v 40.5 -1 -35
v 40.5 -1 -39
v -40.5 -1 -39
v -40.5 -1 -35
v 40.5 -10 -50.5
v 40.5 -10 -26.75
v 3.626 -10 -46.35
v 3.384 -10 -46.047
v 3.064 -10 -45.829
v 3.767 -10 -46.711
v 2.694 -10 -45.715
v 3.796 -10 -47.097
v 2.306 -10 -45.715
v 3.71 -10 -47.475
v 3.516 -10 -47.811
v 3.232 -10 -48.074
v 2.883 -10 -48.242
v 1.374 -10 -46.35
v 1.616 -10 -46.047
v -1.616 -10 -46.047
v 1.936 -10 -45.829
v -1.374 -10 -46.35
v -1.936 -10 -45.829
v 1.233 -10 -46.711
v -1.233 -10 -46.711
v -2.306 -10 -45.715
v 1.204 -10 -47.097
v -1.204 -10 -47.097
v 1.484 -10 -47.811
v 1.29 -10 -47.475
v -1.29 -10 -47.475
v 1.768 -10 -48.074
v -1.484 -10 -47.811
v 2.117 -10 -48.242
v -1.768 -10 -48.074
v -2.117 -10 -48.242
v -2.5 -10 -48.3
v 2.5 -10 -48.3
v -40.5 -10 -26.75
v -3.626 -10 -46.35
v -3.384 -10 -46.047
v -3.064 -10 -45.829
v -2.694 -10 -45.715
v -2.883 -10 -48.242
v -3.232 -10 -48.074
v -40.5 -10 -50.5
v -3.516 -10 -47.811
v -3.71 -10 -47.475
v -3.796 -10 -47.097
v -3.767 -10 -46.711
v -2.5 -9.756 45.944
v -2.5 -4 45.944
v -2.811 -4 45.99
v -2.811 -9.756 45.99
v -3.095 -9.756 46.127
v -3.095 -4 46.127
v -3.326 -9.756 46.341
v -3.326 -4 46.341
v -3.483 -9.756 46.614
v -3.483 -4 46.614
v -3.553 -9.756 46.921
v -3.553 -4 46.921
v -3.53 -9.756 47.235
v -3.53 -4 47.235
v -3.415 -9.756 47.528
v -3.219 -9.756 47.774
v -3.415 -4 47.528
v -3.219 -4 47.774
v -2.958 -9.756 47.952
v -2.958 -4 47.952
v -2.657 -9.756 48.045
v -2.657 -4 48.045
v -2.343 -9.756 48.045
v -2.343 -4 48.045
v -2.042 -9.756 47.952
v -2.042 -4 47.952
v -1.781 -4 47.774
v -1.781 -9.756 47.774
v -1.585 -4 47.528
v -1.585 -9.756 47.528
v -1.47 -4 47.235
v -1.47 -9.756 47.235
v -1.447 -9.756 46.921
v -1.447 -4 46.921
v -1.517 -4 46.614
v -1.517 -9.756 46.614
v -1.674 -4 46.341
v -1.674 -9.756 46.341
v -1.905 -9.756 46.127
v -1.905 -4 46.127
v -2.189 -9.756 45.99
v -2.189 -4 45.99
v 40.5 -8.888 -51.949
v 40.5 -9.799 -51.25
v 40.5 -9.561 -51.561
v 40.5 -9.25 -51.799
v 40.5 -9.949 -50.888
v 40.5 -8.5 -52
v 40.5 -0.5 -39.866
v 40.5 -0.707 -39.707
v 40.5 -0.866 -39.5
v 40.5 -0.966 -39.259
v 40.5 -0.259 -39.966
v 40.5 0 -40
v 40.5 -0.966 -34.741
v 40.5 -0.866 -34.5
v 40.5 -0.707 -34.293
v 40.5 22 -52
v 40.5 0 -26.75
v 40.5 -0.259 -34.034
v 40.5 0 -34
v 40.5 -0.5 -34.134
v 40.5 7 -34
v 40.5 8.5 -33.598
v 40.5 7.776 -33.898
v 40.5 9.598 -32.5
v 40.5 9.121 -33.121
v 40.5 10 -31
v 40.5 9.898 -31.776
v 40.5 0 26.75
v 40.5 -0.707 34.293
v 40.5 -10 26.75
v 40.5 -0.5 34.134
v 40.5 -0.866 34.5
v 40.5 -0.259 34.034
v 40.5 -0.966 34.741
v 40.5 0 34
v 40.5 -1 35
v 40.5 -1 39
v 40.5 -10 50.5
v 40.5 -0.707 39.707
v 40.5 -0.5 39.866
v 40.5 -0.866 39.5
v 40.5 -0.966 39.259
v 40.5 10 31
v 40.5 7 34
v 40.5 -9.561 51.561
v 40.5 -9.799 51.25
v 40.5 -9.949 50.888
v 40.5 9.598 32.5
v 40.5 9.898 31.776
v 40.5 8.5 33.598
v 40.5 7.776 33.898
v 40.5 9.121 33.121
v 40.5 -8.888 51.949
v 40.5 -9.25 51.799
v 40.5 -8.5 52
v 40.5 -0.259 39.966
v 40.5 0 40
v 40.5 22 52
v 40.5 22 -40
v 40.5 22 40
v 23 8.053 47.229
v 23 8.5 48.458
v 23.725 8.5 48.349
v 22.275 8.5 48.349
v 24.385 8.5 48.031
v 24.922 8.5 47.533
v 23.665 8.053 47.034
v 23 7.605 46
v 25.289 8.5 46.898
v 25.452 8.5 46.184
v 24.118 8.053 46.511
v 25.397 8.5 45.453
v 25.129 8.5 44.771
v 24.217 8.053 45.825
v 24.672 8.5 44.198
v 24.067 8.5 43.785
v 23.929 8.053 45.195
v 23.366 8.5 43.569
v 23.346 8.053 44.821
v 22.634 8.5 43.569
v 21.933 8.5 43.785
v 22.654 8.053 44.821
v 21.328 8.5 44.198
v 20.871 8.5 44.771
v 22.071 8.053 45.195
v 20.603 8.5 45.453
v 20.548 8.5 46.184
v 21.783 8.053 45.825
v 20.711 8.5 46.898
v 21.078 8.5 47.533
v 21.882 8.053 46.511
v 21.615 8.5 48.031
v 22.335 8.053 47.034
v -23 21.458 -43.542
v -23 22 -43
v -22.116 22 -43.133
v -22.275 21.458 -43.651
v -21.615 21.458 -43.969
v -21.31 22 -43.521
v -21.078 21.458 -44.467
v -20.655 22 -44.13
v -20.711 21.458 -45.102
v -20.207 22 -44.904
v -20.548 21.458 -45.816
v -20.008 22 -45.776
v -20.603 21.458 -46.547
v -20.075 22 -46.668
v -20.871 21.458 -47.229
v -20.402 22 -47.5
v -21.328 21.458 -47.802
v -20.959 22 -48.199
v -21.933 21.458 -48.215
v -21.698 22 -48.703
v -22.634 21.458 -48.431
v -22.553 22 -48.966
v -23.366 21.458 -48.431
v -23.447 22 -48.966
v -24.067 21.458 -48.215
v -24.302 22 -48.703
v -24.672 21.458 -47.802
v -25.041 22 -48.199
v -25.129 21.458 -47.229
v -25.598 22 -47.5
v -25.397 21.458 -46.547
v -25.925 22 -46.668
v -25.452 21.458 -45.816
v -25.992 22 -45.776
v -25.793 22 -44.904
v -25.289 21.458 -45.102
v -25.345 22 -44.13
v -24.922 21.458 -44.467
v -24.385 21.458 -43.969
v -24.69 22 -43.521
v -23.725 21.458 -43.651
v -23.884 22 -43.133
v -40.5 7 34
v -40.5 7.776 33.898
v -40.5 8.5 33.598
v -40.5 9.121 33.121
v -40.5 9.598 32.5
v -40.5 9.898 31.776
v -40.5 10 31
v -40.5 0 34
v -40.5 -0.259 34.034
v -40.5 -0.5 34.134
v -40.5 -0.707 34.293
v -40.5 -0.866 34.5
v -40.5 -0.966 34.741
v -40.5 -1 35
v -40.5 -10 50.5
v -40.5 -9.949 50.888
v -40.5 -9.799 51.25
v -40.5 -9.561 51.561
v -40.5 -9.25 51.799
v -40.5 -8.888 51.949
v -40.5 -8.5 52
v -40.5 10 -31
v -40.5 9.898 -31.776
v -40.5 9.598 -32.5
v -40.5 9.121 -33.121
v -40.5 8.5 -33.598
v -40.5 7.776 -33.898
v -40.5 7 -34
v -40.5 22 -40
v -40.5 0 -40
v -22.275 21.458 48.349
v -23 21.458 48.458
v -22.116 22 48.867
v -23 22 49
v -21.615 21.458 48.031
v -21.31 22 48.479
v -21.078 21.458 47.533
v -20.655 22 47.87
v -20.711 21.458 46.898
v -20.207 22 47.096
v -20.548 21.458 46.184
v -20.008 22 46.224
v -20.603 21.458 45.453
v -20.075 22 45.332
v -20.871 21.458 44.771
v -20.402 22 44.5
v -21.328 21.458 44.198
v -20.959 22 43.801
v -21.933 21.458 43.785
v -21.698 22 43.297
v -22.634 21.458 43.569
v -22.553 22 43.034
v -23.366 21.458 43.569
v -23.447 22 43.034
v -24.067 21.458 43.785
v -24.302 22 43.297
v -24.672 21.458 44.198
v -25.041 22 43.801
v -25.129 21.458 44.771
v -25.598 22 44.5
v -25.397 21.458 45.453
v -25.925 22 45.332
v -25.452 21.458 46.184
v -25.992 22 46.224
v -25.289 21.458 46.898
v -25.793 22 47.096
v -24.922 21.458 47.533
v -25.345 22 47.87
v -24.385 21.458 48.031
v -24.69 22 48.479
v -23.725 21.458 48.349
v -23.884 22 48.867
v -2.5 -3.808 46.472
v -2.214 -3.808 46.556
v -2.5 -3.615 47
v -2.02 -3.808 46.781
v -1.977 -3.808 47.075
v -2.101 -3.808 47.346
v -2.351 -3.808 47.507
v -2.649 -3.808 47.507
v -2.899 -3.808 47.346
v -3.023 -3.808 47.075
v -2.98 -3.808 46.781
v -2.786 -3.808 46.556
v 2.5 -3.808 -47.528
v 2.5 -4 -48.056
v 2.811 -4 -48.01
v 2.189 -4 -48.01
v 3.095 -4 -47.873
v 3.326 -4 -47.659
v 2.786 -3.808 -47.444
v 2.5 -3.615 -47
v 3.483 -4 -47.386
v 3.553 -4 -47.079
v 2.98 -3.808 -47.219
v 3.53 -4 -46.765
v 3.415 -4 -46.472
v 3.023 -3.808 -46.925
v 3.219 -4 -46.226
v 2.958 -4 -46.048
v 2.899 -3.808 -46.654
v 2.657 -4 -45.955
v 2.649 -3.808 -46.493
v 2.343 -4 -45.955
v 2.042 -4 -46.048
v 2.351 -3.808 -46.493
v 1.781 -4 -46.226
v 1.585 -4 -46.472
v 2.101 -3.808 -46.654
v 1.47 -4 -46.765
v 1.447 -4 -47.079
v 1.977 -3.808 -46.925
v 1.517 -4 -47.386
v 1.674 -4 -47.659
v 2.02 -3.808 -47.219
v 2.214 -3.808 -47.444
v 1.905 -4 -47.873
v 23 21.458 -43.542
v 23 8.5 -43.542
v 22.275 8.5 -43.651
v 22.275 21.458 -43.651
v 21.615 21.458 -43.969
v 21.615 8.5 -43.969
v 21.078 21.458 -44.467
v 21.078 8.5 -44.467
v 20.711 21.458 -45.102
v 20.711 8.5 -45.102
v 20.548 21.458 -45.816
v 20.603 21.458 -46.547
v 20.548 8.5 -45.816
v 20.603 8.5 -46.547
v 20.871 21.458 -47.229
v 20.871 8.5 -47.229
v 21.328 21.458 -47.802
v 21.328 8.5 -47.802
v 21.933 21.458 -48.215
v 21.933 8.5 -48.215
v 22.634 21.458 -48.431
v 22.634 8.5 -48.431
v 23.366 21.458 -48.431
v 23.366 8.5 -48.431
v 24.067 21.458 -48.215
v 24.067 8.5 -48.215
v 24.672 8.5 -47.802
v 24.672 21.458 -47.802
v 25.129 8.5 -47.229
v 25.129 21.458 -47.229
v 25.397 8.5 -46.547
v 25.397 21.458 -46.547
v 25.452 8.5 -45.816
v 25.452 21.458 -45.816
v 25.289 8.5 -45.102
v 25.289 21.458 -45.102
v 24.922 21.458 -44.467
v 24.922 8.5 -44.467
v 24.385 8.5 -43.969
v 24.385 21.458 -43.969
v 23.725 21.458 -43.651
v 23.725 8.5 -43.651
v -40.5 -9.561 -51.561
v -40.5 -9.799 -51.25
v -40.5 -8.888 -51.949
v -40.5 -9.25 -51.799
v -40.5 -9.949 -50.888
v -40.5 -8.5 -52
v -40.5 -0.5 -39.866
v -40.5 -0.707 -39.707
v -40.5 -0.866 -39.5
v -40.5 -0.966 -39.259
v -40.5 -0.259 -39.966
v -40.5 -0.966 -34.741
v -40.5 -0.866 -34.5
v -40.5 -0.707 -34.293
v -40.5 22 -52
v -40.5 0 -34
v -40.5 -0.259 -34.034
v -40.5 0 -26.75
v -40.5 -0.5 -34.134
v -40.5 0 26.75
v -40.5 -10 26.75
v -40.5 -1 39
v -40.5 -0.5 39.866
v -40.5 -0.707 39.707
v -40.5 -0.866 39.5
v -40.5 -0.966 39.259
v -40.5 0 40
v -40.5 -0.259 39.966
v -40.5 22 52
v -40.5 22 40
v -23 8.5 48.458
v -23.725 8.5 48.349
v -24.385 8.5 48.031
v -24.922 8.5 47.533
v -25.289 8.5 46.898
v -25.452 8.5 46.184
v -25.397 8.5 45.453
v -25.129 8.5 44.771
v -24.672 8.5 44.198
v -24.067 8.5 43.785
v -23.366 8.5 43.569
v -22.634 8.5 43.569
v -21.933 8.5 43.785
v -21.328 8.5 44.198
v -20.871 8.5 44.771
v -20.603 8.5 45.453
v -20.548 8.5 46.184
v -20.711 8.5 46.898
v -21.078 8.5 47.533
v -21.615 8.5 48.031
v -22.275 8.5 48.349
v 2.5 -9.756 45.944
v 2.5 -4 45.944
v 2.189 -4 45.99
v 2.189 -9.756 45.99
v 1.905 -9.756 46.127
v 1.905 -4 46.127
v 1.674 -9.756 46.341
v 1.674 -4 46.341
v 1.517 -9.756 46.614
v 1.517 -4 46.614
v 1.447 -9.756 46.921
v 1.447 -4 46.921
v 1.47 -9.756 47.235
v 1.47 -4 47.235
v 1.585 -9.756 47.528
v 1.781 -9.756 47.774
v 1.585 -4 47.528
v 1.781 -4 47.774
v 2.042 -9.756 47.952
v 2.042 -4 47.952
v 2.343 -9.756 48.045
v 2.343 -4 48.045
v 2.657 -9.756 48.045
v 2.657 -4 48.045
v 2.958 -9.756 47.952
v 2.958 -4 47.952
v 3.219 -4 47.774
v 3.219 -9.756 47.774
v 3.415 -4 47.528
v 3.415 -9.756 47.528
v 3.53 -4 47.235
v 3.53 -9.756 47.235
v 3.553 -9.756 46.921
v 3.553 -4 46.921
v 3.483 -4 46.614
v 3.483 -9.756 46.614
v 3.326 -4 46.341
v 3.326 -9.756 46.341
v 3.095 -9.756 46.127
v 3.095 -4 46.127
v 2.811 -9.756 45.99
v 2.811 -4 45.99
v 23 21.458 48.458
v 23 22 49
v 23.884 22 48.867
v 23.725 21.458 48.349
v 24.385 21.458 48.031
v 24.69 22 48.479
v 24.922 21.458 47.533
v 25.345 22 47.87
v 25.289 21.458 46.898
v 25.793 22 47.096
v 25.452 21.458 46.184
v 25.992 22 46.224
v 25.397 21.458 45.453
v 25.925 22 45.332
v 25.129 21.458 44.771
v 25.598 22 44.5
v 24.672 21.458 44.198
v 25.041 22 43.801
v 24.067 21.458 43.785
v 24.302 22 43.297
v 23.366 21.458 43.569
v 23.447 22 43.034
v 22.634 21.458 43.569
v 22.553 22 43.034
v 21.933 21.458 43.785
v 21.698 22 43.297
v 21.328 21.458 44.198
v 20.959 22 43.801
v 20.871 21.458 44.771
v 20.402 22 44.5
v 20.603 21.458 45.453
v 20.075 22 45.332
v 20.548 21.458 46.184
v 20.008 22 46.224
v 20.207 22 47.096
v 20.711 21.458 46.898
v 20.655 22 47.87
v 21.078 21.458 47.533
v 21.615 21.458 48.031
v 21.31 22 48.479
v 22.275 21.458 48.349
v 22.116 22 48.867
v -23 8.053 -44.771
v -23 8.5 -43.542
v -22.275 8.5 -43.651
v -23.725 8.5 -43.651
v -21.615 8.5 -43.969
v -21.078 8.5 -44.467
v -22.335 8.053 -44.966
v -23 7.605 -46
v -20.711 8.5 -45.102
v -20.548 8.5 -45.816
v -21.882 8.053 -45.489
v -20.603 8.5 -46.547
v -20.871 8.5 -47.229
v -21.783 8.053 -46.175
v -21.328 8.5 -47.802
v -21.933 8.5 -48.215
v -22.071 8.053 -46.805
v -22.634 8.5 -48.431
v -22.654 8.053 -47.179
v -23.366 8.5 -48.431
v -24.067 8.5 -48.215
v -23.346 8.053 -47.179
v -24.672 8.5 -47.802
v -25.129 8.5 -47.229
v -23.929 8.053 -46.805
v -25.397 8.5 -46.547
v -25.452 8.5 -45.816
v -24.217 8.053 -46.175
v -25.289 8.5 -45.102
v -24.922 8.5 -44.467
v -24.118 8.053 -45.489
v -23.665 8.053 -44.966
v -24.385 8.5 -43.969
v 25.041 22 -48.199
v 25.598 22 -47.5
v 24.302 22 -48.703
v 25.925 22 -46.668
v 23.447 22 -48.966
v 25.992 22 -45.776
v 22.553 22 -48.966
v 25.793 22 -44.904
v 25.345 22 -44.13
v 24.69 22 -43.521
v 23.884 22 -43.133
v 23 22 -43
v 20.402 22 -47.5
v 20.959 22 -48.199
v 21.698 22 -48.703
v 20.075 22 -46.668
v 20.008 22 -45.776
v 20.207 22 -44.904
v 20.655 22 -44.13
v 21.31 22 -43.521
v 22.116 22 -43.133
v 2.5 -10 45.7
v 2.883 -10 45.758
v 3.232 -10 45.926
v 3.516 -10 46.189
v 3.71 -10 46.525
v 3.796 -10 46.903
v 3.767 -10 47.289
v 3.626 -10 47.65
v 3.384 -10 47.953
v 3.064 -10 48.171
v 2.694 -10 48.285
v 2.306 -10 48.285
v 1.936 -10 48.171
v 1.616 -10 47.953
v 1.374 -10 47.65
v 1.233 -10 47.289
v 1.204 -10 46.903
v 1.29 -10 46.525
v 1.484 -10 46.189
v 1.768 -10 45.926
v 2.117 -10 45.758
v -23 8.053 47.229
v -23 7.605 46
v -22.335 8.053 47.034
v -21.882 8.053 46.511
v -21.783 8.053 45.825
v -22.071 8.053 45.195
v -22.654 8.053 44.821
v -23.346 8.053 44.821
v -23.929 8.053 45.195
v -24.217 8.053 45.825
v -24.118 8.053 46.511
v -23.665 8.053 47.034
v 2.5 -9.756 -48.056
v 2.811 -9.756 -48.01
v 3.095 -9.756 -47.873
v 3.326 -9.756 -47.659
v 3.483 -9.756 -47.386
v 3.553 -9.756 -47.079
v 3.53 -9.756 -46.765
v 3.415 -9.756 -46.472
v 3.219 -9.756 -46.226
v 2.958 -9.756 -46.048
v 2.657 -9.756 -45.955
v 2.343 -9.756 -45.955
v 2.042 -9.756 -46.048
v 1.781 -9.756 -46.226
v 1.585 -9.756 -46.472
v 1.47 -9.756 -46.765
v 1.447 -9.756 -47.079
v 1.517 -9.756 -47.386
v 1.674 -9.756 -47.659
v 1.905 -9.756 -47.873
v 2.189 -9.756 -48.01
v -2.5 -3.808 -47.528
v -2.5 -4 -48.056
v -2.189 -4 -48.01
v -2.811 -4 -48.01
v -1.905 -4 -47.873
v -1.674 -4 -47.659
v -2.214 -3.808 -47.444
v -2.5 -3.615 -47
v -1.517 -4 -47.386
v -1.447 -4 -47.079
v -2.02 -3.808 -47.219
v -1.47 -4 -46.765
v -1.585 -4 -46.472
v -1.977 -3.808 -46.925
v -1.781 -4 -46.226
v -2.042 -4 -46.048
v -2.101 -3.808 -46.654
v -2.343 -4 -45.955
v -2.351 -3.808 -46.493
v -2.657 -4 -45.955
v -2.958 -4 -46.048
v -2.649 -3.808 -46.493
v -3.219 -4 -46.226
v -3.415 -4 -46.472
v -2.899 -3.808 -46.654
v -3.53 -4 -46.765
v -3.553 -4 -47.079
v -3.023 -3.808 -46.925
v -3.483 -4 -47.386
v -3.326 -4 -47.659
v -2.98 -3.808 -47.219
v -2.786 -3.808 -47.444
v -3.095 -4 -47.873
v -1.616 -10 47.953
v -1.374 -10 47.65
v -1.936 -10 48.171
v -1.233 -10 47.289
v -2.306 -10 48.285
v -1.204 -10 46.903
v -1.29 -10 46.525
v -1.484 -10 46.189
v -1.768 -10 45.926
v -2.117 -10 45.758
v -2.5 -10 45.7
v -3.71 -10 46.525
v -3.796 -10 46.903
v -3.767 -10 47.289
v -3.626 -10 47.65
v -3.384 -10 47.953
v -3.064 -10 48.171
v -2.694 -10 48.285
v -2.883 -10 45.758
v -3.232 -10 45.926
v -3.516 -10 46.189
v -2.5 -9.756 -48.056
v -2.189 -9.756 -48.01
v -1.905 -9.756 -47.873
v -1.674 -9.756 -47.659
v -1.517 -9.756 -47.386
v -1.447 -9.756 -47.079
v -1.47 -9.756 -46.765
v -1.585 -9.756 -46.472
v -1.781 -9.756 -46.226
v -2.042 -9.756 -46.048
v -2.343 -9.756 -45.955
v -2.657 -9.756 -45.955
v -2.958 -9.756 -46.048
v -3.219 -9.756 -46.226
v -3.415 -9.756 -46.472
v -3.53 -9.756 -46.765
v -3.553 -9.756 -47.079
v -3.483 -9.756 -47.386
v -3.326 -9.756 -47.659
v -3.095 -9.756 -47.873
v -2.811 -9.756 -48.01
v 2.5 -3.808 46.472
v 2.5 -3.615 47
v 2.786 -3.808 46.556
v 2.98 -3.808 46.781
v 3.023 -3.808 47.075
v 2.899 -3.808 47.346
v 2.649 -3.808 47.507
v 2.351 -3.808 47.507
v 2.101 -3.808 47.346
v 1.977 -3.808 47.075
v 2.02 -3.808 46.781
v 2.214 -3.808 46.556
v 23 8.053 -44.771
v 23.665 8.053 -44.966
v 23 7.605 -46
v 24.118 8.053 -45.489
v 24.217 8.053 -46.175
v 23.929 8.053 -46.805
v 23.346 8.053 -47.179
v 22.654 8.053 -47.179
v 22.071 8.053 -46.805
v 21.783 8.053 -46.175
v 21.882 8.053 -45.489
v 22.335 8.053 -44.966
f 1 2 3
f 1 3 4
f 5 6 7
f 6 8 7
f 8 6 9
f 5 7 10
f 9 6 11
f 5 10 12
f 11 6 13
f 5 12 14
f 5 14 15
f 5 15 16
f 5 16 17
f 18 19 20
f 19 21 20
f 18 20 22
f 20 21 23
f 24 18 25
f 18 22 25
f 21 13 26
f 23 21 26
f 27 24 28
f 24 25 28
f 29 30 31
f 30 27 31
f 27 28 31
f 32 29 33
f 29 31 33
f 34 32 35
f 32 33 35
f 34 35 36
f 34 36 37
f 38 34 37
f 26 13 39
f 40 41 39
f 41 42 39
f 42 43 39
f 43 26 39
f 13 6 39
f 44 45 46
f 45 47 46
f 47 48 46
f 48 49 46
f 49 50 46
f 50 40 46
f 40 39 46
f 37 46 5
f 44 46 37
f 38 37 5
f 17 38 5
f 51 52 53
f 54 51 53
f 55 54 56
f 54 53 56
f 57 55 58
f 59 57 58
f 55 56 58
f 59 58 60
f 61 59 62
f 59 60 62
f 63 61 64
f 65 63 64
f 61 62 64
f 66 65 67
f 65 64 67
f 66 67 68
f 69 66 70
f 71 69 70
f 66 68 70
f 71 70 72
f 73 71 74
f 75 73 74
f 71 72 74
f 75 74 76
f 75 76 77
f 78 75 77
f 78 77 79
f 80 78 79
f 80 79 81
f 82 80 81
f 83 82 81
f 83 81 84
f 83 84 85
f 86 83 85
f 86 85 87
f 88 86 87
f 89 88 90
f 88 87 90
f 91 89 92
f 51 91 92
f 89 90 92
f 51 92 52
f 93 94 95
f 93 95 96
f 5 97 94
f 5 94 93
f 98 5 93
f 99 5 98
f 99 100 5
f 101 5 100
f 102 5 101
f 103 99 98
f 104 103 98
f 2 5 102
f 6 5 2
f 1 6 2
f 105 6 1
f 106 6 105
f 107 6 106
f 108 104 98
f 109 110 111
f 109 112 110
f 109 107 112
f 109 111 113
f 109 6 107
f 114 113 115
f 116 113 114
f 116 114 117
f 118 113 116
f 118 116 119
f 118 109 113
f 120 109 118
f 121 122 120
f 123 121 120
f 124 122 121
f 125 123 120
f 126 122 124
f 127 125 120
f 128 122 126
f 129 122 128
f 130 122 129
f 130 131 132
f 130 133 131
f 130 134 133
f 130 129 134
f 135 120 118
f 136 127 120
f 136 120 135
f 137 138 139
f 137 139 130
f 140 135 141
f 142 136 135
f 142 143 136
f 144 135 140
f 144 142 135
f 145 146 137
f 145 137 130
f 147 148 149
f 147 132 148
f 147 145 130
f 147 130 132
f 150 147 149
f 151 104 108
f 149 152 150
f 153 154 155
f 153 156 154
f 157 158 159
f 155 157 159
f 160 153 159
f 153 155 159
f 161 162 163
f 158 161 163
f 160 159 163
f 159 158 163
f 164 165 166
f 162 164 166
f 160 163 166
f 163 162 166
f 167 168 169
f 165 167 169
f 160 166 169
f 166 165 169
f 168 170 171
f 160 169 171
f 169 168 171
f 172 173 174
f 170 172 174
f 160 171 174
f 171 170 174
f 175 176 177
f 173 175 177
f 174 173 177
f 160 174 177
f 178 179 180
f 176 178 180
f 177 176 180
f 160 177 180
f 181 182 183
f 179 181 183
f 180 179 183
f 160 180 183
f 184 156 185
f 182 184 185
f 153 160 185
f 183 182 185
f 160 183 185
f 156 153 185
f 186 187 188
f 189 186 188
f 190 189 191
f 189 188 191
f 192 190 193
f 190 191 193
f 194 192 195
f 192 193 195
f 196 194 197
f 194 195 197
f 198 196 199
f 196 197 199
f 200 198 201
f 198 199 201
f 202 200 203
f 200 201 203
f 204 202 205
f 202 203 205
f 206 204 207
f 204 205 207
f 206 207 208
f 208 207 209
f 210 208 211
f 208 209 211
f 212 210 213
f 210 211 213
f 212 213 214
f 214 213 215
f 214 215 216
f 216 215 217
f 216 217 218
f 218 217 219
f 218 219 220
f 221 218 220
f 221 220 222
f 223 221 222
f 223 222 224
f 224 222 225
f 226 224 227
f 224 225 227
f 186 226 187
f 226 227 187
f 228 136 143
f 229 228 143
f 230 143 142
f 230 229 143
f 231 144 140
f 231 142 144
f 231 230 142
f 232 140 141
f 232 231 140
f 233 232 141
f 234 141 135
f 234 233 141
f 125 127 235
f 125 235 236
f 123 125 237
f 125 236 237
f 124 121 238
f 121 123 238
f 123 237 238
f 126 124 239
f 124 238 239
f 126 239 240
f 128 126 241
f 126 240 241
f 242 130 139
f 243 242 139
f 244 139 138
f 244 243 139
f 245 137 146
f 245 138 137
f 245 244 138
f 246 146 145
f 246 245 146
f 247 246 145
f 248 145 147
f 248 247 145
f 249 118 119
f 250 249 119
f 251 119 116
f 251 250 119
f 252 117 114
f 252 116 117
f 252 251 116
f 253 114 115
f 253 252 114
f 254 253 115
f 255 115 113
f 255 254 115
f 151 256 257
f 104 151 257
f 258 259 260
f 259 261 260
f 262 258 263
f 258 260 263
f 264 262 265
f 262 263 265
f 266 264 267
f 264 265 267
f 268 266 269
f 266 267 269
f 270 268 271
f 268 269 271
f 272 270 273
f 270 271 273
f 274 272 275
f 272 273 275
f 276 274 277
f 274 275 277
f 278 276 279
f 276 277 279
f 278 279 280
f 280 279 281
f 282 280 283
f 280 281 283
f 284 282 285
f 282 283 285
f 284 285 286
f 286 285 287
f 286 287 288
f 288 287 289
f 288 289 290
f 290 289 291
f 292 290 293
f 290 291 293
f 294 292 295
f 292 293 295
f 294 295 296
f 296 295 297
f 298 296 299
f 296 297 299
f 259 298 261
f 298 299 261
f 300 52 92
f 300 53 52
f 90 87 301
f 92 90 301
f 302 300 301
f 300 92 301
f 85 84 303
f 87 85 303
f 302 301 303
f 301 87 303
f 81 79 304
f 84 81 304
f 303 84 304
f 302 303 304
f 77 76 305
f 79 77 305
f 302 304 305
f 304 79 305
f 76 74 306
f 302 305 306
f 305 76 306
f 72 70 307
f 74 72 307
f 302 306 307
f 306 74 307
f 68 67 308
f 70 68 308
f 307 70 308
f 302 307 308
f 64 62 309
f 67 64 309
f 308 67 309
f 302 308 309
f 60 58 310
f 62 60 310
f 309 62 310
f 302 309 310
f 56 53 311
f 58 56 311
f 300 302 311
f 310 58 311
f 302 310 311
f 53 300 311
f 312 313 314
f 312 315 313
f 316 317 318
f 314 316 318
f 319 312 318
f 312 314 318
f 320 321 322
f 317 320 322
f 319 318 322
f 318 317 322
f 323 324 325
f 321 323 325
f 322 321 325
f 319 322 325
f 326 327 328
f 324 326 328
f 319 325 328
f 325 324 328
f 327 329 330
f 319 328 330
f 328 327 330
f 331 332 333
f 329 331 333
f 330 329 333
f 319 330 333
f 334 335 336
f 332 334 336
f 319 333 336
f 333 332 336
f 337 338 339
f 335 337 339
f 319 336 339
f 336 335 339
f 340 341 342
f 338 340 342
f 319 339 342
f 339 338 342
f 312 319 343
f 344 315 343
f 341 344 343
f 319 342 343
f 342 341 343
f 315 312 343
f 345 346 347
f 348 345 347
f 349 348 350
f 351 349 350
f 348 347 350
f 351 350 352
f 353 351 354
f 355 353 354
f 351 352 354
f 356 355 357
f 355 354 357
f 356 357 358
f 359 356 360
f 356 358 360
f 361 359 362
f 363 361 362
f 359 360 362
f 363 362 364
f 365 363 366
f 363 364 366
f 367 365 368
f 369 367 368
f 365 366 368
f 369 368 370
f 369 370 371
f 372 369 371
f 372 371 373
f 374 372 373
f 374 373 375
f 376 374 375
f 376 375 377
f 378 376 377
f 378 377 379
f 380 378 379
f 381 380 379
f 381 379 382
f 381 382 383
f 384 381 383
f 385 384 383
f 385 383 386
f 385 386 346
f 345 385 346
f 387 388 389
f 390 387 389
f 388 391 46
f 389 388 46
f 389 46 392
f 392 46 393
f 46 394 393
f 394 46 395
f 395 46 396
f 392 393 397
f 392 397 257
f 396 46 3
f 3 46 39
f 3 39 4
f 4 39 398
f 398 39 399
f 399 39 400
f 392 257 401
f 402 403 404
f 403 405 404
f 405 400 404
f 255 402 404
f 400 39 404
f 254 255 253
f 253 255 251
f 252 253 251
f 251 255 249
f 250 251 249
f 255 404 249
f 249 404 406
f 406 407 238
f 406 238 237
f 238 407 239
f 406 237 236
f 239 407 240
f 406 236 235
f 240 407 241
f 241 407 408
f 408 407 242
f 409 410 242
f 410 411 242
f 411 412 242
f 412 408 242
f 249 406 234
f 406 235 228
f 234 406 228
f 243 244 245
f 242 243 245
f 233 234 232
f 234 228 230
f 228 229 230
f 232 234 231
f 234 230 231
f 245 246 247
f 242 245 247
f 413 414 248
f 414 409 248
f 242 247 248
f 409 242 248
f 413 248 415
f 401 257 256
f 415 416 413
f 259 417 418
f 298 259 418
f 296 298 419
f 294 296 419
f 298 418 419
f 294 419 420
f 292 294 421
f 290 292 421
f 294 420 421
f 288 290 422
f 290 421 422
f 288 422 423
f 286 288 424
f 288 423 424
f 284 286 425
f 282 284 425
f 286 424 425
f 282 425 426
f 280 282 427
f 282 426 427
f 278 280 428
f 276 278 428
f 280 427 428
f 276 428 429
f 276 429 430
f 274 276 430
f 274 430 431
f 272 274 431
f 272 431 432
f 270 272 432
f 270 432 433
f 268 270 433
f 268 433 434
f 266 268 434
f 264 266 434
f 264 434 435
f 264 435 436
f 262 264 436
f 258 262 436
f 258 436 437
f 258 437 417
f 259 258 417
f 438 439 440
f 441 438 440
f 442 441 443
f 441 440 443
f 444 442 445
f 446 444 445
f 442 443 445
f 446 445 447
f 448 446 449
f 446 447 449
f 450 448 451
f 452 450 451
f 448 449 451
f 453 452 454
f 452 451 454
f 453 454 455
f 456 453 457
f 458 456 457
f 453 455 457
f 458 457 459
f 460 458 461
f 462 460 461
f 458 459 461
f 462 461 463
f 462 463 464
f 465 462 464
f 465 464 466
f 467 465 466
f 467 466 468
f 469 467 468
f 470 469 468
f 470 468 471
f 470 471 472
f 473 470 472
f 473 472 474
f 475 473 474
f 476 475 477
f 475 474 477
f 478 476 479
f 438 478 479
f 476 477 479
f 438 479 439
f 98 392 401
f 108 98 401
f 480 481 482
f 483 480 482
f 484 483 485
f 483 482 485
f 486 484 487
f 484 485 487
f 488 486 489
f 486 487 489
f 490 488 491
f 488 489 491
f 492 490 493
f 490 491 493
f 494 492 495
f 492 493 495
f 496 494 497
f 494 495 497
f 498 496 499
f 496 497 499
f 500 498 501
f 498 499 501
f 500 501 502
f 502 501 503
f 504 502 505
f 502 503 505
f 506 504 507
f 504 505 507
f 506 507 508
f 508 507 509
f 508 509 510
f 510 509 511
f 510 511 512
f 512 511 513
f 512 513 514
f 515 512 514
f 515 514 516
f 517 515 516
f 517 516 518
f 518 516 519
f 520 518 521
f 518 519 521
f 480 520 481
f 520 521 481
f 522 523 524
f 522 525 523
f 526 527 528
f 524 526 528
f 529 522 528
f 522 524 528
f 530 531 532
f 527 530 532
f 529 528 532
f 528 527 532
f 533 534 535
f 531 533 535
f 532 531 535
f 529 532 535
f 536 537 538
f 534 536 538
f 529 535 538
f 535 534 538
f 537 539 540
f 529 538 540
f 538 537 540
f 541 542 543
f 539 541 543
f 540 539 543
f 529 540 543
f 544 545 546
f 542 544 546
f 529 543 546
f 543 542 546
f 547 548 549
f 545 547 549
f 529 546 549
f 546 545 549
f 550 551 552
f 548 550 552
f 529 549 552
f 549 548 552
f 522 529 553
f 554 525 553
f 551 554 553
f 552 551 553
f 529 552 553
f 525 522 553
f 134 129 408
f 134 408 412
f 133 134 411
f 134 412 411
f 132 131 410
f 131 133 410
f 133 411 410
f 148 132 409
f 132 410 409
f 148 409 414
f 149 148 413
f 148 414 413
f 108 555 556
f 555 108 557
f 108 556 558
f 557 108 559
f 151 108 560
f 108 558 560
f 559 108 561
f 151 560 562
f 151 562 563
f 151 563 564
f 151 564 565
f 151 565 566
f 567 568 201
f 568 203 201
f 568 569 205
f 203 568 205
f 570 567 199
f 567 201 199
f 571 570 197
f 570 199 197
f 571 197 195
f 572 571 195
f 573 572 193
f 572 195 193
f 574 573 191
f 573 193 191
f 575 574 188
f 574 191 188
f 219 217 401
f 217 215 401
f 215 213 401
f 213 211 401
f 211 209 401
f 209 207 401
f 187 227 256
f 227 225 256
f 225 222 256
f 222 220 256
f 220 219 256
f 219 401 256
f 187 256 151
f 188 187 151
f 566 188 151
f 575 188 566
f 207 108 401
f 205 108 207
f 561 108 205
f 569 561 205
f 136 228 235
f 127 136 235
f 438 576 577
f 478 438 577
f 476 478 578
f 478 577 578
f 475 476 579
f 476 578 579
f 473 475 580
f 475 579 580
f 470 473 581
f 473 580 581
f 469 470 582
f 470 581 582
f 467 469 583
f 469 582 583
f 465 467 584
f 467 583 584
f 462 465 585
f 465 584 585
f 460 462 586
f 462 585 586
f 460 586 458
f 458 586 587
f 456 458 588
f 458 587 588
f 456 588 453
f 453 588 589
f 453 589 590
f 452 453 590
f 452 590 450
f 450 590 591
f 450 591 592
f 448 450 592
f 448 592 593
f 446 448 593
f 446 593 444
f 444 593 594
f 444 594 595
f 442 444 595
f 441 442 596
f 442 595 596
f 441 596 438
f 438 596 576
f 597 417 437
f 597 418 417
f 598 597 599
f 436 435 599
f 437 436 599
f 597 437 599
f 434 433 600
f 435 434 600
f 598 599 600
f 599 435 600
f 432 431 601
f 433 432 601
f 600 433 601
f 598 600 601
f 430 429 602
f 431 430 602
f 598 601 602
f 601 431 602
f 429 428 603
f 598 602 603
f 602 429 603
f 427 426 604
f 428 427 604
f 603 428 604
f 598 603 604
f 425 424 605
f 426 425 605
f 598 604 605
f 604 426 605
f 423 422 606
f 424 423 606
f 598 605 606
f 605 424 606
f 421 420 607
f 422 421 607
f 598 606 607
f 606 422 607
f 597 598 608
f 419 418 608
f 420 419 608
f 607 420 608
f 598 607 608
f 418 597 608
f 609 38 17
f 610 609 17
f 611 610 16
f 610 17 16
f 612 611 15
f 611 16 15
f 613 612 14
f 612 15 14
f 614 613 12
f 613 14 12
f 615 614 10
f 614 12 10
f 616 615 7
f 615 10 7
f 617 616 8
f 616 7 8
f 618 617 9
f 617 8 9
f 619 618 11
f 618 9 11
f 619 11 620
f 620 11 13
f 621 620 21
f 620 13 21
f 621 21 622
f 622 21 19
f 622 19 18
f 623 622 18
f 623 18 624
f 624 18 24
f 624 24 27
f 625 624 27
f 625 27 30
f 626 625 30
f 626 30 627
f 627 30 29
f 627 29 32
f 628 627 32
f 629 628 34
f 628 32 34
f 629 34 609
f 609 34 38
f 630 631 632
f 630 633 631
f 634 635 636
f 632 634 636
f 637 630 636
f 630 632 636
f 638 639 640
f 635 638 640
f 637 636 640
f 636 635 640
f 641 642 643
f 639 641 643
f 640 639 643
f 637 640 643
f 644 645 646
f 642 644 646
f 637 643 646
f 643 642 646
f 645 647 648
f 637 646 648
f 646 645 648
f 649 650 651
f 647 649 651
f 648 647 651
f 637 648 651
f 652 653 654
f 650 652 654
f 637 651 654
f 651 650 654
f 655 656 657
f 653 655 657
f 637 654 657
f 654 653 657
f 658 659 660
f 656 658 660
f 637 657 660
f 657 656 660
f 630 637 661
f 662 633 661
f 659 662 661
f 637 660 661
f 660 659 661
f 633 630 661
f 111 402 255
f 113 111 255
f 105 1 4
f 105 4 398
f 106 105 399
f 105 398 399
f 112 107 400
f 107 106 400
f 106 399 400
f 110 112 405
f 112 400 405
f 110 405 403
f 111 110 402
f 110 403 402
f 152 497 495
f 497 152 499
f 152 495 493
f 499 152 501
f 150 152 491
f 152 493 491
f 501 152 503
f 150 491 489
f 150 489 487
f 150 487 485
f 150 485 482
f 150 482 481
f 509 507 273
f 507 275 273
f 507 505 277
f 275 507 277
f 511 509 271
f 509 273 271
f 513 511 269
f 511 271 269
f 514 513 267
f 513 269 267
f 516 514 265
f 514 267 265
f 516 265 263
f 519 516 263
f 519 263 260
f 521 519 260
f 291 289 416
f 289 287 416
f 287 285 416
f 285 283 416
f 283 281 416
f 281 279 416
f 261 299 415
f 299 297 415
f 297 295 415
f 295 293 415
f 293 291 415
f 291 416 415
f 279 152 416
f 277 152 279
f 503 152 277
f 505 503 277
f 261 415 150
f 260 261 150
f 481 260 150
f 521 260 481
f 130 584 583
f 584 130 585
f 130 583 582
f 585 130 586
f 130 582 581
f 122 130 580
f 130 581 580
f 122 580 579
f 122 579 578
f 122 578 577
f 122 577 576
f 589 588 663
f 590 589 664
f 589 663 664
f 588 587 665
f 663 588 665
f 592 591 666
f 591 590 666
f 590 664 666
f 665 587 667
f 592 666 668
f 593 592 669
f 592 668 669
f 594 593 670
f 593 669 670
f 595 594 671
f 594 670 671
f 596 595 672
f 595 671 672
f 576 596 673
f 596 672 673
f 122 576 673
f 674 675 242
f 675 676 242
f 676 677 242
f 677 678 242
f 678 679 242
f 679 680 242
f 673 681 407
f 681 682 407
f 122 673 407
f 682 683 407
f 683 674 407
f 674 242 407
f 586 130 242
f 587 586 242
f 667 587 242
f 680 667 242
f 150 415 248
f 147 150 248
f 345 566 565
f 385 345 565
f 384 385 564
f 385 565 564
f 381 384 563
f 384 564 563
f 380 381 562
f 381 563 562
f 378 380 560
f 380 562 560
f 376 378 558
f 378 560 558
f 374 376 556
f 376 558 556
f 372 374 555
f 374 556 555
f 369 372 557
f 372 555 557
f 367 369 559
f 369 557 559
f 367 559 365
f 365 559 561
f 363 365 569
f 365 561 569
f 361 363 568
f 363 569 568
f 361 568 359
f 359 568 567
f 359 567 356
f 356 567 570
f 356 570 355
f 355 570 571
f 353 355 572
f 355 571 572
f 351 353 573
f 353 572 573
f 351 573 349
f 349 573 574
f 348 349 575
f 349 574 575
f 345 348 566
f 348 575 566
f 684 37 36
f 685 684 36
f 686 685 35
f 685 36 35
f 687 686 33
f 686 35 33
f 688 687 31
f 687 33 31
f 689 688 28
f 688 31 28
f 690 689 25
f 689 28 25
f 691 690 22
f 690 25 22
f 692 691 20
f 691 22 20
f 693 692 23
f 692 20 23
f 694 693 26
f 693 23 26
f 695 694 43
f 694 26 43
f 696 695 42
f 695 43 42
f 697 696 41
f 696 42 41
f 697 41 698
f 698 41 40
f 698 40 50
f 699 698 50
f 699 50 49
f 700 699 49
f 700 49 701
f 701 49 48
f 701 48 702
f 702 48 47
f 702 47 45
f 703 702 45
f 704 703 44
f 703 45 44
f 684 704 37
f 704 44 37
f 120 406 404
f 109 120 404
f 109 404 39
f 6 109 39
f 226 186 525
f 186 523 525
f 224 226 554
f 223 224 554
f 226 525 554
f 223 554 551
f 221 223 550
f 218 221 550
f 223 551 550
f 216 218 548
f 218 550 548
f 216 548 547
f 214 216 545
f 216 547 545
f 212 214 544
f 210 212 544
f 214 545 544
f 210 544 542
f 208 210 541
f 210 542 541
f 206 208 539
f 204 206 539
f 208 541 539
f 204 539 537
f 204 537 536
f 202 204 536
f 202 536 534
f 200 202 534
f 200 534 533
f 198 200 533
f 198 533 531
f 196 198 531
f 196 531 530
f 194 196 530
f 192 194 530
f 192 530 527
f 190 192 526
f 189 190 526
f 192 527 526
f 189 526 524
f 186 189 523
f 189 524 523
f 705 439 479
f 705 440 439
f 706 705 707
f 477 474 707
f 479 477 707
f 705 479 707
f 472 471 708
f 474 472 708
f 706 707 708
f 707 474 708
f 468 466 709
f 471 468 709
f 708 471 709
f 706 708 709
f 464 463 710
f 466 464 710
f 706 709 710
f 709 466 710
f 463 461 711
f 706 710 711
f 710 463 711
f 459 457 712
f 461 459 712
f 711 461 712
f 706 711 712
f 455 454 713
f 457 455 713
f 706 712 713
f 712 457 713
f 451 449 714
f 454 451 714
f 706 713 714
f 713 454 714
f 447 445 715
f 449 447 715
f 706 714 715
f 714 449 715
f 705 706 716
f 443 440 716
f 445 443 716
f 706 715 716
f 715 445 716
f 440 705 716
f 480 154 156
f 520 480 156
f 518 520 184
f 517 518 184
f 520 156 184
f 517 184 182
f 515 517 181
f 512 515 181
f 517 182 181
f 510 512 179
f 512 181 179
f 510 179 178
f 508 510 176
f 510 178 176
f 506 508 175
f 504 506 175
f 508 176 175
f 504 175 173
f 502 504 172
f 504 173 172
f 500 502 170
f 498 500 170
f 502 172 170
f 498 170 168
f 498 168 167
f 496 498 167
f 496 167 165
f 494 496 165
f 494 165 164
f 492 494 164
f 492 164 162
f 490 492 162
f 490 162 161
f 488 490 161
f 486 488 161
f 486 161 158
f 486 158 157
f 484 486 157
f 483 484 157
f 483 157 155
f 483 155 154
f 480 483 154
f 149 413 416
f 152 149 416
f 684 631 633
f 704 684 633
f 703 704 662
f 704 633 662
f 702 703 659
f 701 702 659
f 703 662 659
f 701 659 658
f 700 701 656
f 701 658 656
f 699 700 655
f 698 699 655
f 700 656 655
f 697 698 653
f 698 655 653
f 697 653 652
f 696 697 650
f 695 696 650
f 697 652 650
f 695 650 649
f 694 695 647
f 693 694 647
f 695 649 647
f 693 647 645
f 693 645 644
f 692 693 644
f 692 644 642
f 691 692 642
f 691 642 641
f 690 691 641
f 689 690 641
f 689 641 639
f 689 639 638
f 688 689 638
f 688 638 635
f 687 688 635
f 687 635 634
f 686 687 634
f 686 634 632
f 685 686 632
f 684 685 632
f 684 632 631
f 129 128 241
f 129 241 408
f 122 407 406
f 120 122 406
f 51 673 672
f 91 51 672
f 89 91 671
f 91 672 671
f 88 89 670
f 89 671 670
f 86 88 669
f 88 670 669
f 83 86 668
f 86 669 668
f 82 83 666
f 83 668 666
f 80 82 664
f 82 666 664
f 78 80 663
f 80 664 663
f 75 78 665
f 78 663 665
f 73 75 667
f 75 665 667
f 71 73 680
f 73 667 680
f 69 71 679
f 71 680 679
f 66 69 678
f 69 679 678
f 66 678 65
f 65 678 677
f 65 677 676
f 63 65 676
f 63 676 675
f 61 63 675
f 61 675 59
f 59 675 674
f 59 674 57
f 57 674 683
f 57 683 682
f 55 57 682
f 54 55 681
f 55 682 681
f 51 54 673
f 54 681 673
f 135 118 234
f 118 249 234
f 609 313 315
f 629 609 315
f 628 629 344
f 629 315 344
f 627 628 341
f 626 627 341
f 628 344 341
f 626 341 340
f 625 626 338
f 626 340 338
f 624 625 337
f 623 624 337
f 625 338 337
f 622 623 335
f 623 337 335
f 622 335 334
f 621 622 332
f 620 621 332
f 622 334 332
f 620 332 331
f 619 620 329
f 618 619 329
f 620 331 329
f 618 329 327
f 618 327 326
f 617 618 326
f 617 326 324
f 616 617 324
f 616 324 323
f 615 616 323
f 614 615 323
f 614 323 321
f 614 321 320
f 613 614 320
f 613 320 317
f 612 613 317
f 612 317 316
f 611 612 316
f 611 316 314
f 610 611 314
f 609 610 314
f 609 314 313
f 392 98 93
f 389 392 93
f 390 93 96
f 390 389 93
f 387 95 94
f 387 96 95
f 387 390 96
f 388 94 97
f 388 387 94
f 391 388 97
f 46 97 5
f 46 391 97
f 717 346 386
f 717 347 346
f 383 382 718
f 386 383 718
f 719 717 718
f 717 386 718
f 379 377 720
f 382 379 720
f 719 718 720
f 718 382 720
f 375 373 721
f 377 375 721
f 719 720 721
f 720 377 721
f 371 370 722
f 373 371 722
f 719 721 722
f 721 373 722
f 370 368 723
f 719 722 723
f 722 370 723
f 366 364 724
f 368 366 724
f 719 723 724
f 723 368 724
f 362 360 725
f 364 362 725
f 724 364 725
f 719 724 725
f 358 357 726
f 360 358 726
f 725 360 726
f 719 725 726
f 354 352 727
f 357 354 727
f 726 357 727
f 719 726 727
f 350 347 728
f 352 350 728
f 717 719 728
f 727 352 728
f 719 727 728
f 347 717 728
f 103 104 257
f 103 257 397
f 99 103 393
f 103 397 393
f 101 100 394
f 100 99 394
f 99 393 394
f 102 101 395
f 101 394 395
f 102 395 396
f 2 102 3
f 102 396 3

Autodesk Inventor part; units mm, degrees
sketch "Sketch_1" plane through (0, 0, 0) normal (1, 0, 0) x (0, 1, 0)
  line L0 (22, 52) -> (-8.5, 52)
  arc A0 (-8.5, 52) -> (-10, 50.5) centre (-8.5, 50.5) ccw
  line L1 (-10, 50.5) -> (-10, 26.75)
  line L2 (-10, 26.75) -> (0, 26.75)
  line L3 (0, 26.75) -> (0, -26.75)
  line L4 (0, -26.75) -> (-10, -26.75)
  line L5 (-10, -26.75) -> (-10, -50.5)
  arc A1 (-10, -50.5) -> (-8.5, -52) centre (-8.5, -50.5) ccw
  line L6 (-8.5, -52) -> (22, -52)
  line L7 (22, -52) -> (22, -40)
  line L8 (22, -40) -> (0, -40)
  arc A2 (-1, -39) -> (0, -40) centre (0, -39) ccw
  line L9 (-1, -39) -> (-1, -35)
  arc A3 (0, -34) -> (-1, -35) centre (0, -35) ccw
  line L10 (0, -34) -> (7, -34)
  arc A4 (7, -34) -> (10, -31) centre (7, -31) ccw
  line L11 (10, -31) -> (10, 31)
  arc A5 (10, 31) -> (7, 34) centre (7, 31) ccw
  line L12 (7, 34) -> (0, 34)
  arc A6 (-1, 35) -> (0, 34) centre (0, 35) ccw
  line L13 (-1, 35) -> (-1, 39)
  arc A7 (0, 40) -> (-1, 39) centre (0, 39) ccw
  line L14 (0, 40) -> (22, 40)
  line L15 (22, 40) -> (22, 52)
extrude "Extrusion1" add sketch "Sketch_1" along normal mid plane 81
sketch "Sketch2" plane through (-40.5, 22, 40) normal (0, 1, 0) x (1, 0, 0)
  point P0 (17.5, -6)
hole "Drilling 1" at (-23, 22, 46) direction (0, -1, 0) diameter 4.917 depth 13.5 tip angle 140 countersink diameter 6 countersink angle 90 thread size "M6x1" class "6H" standard "ISO Metric profile"
pattern_linear "Rectangular Pattern1" count 2 spacing 46 along (1, 0, 0) count 2 spacing 92 along (0, 0, -1) of "Drilling 1"
sketch "Sketch3" plane through (-40.5, -10, 50.5) normal (0, -1, 0) x (1, 0, 0)
  point P0 (38, -3.5)
hole "Drilling 2" at (-2.5, -10, 47) direction (0, 1, 0) diameter 2.1129 depth 6 tip angle 140 countersink diameter 2.6 countersink angle 90 thread size "M2.6x0.45" class "6H" standard "ISO Metric profile"
pattern_linear "Rectangular Pattern2" count 2 spacing 5 along (1, 0, 0) count 2 spacing 94 along (0, 0, -1) of "Drilling 2"
ref_plane "slider_spacer_sensor_dog_XY" through (0, -10, 47) normal (0, 1, 0) x (1, 0, 0)
ref_plane "slider_spacer_sensor_dog_YZ" through (0, -10, 47) normal (1, 0, 0) x (0, 0, -1)
ref_plane "slider_spacer_sensor_dog_ZX" through (0, -10, 47) normal (0, 0, -1) x (0, 1, 0)
ref_plane "slider_spacer_slider_XY" through (0, 0, 0) normal (0, 1, 0) x (1, 0, 0)
ref_plane "slider_spacer_slider_YZ" through (0, 0, 0) normal (1, 0, 0) x (0, 0, -1)
ref_plane "slider_spacer_slider_ZX" through (0, 0, 0) normal (0, 0, -1) x (0, 1, 0)
properties part number "KR45H-A-Slider Spacer"
